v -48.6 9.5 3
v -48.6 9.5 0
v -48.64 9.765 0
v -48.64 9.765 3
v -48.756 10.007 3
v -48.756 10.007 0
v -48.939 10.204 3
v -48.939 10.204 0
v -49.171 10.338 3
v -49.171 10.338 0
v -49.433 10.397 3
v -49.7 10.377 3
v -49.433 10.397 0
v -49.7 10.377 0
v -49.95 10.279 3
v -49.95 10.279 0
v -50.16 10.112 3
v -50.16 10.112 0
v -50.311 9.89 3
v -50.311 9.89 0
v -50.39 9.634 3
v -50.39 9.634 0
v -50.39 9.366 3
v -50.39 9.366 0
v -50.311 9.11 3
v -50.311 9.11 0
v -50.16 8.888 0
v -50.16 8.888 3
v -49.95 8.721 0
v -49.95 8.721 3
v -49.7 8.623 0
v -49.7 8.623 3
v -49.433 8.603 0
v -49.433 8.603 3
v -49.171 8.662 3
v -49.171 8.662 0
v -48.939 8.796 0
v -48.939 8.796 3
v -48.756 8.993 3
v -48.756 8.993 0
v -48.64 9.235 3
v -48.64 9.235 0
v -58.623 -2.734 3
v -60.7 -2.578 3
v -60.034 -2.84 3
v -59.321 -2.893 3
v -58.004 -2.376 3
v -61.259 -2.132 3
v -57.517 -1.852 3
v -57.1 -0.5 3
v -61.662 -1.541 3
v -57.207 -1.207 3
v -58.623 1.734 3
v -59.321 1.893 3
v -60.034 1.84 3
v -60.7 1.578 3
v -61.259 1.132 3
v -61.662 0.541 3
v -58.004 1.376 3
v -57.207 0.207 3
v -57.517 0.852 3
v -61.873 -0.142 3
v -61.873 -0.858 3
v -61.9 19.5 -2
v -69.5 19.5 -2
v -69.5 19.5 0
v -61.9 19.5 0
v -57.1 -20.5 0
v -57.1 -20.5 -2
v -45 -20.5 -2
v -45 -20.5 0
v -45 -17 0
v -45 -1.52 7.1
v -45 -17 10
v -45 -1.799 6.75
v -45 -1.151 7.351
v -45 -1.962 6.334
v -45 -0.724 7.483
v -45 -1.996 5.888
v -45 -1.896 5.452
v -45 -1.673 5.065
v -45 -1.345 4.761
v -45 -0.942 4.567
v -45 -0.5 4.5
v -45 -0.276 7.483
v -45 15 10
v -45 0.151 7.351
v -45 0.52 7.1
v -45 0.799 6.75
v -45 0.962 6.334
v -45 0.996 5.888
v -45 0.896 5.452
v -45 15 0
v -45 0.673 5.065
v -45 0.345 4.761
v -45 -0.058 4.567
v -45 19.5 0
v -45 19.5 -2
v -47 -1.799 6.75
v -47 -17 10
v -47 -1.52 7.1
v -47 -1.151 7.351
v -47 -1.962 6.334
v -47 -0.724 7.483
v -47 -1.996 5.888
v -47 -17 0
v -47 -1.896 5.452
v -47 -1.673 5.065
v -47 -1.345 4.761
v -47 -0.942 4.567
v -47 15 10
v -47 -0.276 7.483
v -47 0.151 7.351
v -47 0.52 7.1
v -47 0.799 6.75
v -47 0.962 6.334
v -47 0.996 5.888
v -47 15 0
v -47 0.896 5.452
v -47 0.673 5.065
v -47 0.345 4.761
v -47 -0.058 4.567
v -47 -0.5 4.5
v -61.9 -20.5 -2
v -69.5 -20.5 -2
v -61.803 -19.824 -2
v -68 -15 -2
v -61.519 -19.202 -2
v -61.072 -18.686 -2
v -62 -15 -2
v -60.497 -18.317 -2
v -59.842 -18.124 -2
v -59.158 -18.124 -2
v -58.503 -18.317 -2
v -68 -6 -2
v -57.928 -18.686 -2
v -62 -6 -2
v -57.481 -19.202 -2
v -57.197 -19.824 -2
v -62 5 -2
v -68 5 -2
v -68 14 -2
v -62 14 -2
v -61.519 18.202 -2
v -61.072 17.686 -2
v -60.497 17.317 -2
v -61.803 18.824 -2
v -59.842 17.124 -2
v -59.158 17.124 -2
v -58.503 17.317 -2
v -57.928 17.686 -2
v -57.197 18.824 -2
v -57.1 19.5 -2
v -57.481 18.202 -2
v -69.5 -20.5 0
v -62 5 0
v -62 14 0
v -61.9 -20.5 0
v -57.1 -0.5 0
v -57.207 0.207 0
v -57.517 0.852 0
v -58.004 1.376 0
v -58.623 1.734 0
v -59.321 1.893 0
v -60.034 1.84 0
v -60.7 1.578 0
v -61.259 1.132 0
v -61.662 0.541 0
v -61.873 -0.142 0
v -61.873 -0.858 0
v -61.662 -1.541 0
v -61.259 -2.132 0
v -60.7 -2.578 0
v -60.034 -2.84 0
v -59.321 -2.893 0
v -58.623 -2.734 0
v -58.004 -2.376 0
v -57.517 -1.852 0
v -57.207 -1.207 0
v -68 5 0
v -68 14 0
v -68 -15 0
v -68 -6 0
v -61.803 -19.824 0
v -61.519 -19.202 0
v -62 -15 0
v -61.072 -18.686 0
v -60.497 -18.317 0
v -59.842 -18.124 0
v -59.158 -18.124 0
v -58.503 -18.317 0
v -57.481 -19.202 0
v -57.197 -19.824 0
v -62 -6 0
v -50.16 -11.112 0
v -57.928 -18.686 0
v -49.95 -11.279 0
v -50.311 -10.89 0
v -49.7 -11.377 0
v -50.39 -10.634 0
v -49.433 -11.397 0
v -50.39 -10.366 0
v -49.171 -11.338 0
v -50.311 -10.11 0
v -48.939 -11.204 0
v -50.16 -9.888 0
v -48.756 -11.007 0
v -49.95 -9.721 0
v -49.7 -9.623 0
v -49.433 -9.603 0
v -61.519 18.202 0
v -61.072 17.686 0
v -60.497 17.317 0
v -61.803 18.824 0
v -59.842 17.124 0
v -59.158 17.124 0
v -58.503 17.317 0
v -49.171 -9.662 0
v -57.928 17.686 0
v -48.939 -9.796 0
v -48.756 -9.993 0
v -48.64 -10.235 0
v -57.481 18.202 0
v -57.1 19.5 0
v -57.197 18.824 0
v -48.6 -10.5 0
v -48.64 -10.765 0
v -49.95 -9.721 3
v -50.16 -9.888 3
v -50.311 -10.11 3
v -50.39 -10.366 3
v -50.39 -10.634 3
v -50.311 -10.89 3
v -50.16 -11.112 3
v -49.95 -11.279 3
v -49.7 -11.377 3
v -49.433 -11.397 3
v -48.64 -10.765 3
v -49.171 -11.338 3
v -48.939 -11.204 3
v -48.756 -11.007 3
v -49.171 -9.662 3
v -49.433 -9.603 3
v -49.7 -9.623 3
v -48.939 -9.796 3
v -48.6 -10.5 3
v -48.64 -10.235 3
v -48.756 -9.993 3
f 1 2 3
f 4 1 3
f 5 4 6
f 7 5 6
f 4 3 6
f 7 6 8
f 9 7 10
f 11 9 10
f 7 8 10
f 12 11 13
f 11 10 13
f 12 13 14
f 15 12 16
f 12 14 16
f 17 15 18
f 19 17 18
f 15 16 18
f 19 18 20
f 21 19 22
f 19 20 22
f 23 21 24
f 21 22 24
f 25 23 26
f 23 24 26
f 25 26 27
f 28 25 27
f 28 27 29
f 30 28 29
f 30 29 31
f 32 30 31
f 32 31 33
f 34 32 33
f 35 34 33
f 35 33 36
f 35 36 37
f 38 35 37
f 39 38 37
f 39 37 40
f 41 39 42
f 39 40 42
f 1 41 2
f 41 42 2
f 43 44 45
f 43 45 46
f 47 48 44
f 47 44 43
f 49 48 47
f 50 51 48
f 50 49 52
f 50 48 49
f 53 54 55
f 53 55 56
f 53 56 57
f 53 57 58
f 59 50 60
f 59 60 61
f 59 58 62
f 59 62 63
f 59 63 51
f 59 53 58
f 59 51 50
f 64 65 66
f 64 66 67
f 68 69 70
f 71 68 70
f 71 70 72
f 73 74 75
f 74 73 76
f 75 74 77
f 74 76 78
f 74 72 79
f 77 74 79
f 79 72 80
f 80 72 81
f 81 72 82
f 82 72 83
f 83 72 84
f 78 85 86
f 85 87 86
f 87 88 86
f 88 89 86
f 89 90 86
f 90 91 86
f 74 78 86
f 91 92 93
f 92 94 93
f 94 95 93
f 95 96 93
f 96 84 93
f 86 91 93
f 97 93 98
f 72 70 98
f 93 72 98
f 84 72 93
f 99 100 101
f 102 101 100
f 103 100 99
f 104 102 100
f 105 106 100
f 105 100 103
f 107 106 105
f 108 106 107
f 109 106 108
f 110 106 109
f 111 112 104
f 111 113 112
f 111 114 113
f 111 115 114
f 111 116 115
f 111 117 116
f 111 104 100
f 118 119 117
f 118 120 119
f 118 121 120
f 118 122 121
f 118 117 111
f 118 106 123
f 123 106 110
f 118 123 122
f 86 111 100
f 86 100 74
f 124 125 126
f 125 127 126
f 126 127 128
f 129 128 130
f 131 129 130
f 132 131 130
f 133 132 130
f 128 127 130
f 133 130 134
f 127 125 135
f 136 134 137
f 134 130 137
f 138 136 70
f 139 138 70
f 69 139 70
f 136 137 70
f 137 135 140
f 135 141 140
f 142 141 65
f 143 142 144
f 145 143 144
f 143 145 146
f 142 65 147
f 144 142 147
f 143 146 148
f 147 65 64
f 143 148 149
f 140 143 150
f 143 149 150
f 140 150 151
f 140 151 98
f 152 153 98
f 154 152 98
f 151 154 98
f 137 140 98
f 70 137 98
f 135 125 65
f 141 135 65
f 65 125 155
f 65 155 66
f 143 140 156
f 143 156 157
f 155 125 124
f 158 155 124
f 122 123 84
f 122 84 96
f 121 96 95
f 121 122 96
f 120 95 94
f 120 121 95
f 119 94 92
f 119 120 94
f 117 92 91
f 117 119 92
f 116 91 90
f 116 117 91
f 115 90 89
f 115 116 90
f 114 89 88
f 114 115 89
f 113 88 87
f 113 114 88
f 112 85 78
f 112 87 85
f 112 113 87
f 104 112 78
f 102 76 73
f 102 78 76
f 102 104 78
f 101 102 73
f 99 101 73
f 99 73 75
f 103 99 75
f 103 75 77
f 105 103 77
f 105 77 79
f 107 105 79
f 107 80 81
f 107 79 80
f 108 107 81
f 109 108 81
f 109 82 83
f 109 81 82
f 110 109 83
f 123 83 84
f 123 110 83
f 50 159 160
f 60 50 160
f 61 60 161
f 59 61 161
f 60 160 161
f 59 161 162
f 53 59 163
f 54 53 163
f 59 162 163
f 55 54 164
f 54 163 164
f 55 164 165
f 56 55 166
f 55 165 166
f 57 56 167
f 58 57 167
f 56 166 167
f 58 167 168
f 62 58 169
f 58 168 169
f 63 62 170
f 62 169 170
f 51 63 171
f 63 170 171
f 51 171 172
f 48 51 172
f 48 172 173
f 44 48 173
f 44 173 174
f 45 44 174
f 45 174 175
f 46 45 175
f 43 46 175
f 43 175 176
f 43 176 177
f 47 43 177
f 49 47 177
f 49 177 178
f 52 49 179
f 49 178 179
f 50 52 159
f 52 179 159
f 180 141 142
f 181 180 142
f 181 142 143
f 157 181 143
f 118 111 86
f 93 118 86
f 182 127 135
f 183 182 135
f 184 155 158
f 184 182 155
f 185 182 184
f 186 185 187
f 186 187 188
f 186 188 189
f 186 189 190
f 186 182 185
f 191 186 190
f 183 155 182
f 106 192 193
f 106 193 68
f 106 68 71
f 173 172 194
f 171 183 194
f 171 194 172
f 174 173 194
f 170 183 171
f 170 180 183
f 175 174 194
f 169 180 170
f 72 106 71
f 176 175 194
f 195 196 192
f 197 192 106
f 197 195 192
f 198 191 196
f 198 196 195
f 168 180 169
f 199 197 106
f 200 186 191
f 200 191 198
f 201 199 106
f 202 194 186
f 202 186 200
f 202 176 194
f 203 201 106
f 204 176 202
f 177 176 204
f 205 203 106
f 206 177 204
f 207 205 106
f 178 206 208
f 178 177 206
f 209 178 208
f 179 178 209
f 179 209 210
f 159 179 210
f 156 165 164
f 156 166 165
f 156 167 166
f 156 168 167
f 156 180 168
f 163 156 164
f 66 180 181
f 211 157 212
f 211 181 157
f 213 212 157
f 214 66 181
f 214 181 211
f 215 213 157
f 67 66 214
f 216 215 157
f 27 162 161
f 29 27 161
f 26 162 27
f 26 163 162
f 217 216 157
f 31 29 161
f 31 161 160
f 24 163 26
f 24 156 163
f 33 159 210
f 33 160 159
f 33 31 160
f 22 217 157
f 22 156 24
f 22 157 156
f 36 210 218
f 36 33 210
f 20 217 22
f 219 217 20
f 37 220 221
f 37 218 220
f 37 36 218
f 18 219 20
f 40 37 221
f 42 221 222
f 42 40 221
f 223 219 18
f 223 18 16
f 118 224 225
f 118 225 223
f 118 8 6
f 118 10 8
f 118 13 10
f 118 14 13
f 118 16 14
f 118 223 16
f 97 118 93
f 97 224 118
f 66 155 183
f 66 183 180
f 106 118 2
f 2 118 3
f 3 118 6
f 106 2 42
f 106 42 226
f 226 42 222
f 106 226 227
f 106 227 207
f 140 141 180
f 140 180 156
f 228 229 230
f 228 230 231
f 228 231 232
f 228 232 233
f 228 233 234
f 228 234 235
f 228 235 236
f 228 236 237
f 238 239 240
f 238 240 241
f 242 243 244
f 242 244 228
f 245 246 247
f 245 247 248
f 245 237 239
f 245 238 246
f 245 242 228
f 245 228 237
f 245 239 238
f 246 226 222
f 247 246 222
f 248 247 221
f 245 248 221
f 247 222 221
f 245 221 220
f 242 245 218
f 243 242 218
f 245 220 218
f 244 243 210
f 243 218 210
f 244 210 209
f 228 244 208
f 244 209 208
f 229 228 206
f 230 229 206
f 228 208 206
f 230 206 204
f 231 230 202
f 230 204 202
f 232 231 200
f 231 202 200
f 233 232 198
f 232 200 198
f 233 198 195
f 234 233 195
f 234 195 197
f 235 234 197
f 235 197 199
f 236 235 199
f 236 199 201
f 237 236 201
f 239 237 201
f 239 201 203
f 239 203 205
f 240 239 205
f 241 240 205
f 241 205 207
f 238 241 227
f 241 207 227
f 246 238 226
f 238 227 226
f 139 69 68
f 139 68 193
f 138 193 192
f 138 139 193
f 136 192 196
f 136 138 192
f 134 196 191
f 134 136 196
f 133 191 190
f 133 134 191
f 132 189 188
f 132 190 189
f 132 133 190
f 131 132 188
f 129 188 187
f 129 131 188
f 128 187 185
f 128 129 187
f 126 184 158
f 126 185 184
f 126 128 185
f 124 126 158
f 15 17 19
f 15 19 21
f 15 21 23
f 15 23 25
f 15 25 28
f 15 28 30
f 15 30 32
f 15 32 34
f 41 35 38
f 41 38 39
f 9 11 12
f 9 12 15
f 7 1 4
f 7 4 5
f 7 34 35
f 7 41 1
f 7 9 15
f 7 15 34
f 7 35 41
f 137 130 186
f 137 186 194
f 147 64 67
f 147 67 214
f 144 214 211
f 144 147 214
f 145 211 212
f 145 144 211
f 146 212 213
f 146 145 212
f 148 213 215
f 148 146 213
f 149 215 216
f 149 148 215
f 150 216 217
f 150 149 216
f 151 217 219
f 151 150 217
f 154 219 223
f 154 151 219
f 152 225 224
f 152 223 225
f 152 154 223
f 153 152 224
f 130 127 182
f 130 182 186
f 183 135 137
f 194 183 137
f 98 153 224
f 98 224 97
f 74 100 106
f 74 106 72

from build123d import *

# Parameters (mm, degrees)
CYLINDER028_R           = 1.5
CYLINDER028_DEPTH       = 10
CYLINDER028_PITCH_ANGLE = 90
CYLINDER023_R           = 2.4
CYLINDER023_DEPTH       = 3
CYLINDER026_R           = 0.9
CYLINDER026_DEPTH       = 3
CYLINDER027_R           = 0.9
CYLINDER027_DEPTH       = 3
CYLINDER025_R           = 2.4
CYLINDER025_DEPTH       = 6
CYLINDER024_R           = 2.4
CYLINDER024_DEPTH       = 5
BOX042_W                = 2
BOX042_H                = 32
BOX042_DEPTH            = 10
BOX041_W                = 6
BOX041_H                = 9
BOX041_DEPTH            = 10
BOX040_W                = 6
BOX040_H                = 9
BOX040_DEPTH            = 10
BOX039_W                = 24.5
BOX039_H                = 40
BOX039_DEPTH            = 2


with BuildPart() as cilindro028:
    # Cylinder028 → Cylinder028 (new body)
    with BuildSketch(Plane.XY):
        Circle(CYLINDER028_R)
    extrude(amount=CYLINDER028_DEPTH)


with BuildPart() as cilindro028_1:
    # Cylinder028 pitch: moved
    add(cilindro028.part.rotate(Axis((0, 0, 0), (0, 1, 0)), CYLINDER028_PITCH_ANGLE))


with BuildPart() as cilindro028_2:
    # Cylinder028 placement: moved
    add(cilindro028_1.part.moved(Location((-49, -0.5, 6))))


with BuildPart() as cilindro023:
    # Cylinder023 → Cylinder023 (new body)
    with BuildSketch(Plane(origin=(-59.5, -0.5, 0), x_dir=(1, 0, 0), z_dir=(0, 0, 1))):
        Circle(CYLINDER023_R)
    extrude(amount=CYLINDER023_DEPTH)


with BuildPart() as cilindro026:
    # Cylinder026 → Cylinder026 (new body)
    with BuildSketch(Plane(origin=(-49.5, 9.5, 0), x_dir=(1, 0, 0), z_dir=(0, 0, 1))):
        Circle(CYLINDER026_R)
    extrude(amount=CYLINDER026_DEPTH)


with BuildPart() as cilindro027:
    # Cylinder027 → Cylinder027 (new body)
    with BuildSketch(Plane(origin=(-49.5, -10.5, 0), x_dir=(1, 0, 0), z_dir=(0, 0, 1))):
        Circle(CYLINDER027_R)
    extrude(amount=CYLINDER027_DEPTH)


with BuildPart() as cilindro025:
    # Cylinder025 → Cylinder025 (new body)
    with BuildSketch(Plane(origin=(-59.5, -20.5, -4), x_dir=(1, 0, 0), z_dir=(0, 0, 1))):
        Circle(CYLINDER025_R)
    extrude(amount=CYLINDER025_DEPTH)


with BuildPart() as cilindro024:
    # Cylinder024 → Cylinder024 (new body)
    with BuildSketch(Plane(origin=(-59.5, 19.5, -3), x_dir=(1, 0, 0), z_dir=(0, 0, 1))):
        Circle(CYLINDER024_R)
    extrude(amount=CYLINDER024_DEPTH)


with BuildPart() as cubo036:
    # Box042 → Box042 (new body)
    with BuildSketch(Plane(origin=(-47, -17, 0), x_dir=(1, 0, 0), z_dir=(0, 0, 1))):
        with Locations((1, 16)):
            Rectangle(BOX042_W, BOX042_H)
    extrude(amount=BOX042_DEPTH)


with BuildPart() as cubo035:
    # Box041 → Box041 (new body)
    with BuildSketch(Plane(origin=(-68, 5, -3), x_dir=(1, 0, 0), z_dir=(0, 0, 1))):
        with Locations((3, 4.5)):
            Rectangle(BOX041_W, BOX041_H)
    extrude(amount=BOX041_DEPTH)


with BuildPart() as cubo034:
    # Box040 → Box040 (new body)
    with BuildSketch(Plane(origin=(-68, -15, -3), x_dir=(1, 0, 0), z_dir=(0, 0, 1))):
        with Locations((3, 4.5)):
            Rectangle(BOX040_W, BOX040_H)
    extrude(amount=BOX040_DEPTH)


with BuildPart() as soportesensoreslinefinder:
    # Box039 → Box039 (new body)
    with BuildSketch(Plane(origin=(-69.5, -20.5, -2), x_dir=(1, 0, 0), z_dir=(0, 0, 1))):
        with Locations((12.25, 20)):
            Rectangle(BOX039_W, BOX039_H)
    extrude(amount=BOX039_DEPTH)

    # Cut049: cut Cubo034
    add(cubo034.part, mode=Mode.SUBTRACT)

    # Cut050: cut Cubo035
    add(cubo035.part, mode=Mode.SUBTRACT)

    # Fusion011: union Cubo036
    add(cubo036.part)

    # Cut051: cut Cilindro024
    add(cilindro024.part, mode=Mode.SUBTRACT)

    # Cut052: cut Cilindro025
    add(cilindro025.part, mode=Mode.SUBTRACT)

    # Fusion012: union Cilindro023, Cilindro026, Cilindro027
    add(cilindro023.part)
    add(cilindro026.part)
    add(cilindro027.part)

    # Cut053: cut Cilindro028
    add(cilindro028_2.part, mode=Mode.SUBTRACT)


solid = soportesensoreslinefinder.part
